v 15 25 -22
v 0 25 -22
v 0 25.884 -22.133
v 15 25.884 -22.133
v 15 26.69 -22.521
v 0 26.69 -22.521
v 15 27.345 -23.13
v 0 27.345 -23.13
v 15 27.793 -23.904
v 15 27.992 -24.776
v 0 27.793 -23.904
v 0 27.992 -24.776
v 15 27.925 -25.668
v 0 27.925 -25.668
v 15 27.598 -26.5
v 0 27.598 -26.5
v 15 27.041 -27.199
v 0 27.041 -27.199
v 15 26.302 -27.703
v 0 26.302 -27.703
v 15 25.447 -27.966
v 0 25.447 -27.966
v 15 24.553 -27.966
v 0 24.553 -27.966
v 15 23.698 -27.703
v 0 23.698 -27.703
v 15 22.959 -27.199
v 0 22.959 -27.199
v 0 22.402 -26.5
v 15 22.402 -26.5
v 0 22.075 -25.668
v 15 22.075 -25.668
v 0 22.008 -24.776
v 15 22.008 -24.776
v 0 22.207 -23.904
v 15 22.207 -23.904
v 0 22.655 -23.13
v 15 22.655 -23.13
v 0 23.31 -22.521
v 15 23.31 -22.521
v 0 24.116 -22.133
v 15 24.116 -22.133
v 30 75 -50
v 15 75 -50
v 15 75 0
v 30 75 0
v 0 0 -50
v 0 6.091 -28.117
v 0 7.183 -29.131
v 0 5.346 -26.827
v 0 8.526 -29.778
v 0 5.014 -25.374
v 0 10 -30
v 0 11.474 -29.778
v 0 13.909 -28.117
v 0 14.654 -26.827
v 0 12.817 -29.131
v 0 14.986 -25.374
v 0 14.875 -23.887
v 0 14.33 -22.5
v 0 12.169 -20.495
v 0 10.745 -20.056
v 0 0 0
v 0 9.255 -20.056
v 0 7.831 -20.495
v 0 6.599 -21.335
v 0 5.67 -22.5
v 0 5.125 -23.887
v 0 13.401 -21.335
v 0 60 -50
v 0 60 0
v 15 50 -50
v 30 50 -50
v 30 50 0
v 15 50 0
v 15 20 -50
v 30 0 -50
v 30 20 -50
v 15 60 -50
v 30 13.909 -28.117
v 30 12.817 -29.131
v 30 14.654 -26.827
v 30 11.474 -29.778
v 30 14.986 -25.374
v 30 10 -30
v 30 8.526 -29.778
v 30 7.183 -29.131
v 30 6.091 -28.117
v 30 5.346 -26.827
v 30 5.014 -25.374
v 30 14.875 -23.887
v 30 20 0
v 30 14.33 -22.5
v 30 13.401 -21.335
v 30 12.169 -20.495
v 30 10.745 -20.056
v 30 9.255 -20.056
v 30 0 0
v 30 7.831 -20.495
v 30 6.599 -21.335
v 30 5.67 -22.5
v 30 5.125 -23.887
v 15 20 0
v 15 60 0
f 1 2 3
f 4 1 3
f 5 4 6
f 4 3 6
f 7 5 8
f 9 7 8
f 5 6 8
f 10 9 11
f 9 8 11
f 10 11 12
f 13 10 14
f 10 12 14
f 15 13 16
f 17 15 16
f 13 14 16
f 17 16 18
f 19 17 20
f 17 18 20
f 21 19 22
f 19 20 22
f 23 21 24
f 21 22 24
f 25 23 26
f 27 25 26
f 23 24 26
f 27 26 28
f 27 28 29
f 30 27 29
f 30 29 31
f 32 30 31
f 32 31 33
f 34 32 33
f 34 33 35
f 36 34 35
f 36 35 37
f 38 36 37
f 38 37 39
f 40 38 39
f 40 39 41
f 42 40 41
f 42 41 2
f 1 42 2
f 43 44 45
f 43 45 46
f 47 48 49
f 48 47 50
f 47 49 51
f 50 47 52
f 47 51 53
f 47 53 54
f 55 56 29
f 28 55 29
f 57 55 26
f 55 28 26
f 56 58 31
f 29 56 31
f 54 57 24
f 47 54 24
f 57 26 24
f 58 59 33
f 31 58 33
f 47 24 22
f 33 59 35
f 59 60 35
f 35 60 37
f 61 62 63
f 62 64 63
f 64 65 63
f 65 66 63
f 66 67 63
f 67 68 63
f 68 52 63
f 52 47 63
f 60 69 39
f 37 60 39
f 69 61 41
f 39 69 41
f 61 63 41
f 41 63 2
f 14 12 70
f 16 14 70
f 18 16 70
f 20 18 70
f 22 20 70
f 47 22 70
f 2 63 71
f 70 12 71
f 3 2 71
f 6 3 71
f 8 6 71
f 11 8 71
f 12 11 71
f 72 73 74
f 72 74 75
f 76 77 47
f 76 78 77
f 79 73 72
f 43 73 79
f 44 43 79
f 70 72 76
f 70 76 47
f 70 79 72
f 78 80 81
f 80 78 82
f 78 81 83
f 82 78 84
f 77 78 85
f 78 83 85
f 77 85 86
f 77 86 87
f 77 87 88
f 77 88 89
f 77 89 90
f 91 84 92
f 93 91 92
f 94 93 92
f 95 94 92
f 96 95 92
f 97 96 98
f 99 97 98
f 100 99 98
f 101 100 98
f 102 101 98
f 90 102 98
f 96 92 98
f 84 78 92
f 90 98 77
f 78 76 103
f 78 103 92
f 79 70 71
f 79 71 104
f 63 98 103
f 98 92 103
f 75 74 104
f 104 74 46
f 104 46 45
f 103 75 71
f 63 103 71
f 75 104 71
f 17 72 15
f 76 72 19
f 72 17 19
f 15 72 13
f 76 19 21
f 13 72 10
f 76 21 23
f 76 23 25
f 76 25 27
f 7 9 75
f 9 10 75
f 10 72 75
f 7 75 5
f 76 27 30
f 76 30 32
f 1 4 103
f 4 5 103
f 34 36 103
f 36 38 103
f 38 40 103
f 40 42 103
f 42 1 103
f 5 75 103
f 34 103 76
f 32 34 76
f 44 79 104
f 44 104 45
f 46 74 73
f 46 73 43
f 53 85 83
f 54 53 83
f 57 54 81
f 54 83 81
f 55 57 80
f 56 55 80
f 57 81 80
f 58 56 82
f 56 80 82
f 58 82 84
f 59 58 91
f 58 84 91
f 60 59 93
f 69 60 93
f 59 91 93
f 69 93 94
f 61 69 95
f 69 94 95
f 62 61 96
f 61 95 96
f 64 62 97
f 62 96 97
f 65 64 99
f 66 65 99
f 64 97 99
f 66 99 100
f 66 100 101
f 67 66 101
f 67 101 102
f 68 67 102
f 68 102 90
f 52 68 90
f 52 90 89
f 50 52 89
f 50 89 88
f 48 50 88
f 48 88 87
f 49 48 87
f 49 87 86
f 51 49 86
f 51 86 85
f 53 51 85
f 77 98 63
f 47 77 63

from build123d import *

# Parameters (mm, degrees)
BOSS_EXTRUDE1_DEPTH = 50
SKETCH2_R           = 5
CUT_EXTRUDE1_DEPTH  = 50
SKETCH3_R           = 3
CUT_EXTRUDE2_DEPTH  = 101


with BuildPart() as part:
    # Sketch1 → Boss-Extrude1 (new body)
    with BuildSketch(Plane.XY):
        Polygon((30, 0), (0, 0), (0, 60), (15, 60), (15, 75), (30, 75), (30, 60), (30, 50), (15, 50), (15, 20), (30, 20), align=None)
    extrude(amount=-BOSS_EXTRUDE1_DEPTH)

    # Sketch2 → Cut-Extrude1 (cut)
    with BuildSketch(Plane(origin=(30, 0, 0), x_dir=(0, 0, -1), z_dir=(1, 0, 0))):
        with Locations((25, 10)):
            Circle(SKETCH2_R)
    extrude(amount=-CUT_EXTRUDE1_DEPTH, mode=Mode.SUBTRACT)

    # Sketch3 → Cut-Extrude2 (cut)
    with BuildSketch(Plane.ZY):
        with Locations((-25, 25)):
            Circle(SKETCH3_R)
    extrude(amount=-CUT_EXTRUDE2_DEPTH, mode=Mode.SUBTRACT)


solid = part.part
